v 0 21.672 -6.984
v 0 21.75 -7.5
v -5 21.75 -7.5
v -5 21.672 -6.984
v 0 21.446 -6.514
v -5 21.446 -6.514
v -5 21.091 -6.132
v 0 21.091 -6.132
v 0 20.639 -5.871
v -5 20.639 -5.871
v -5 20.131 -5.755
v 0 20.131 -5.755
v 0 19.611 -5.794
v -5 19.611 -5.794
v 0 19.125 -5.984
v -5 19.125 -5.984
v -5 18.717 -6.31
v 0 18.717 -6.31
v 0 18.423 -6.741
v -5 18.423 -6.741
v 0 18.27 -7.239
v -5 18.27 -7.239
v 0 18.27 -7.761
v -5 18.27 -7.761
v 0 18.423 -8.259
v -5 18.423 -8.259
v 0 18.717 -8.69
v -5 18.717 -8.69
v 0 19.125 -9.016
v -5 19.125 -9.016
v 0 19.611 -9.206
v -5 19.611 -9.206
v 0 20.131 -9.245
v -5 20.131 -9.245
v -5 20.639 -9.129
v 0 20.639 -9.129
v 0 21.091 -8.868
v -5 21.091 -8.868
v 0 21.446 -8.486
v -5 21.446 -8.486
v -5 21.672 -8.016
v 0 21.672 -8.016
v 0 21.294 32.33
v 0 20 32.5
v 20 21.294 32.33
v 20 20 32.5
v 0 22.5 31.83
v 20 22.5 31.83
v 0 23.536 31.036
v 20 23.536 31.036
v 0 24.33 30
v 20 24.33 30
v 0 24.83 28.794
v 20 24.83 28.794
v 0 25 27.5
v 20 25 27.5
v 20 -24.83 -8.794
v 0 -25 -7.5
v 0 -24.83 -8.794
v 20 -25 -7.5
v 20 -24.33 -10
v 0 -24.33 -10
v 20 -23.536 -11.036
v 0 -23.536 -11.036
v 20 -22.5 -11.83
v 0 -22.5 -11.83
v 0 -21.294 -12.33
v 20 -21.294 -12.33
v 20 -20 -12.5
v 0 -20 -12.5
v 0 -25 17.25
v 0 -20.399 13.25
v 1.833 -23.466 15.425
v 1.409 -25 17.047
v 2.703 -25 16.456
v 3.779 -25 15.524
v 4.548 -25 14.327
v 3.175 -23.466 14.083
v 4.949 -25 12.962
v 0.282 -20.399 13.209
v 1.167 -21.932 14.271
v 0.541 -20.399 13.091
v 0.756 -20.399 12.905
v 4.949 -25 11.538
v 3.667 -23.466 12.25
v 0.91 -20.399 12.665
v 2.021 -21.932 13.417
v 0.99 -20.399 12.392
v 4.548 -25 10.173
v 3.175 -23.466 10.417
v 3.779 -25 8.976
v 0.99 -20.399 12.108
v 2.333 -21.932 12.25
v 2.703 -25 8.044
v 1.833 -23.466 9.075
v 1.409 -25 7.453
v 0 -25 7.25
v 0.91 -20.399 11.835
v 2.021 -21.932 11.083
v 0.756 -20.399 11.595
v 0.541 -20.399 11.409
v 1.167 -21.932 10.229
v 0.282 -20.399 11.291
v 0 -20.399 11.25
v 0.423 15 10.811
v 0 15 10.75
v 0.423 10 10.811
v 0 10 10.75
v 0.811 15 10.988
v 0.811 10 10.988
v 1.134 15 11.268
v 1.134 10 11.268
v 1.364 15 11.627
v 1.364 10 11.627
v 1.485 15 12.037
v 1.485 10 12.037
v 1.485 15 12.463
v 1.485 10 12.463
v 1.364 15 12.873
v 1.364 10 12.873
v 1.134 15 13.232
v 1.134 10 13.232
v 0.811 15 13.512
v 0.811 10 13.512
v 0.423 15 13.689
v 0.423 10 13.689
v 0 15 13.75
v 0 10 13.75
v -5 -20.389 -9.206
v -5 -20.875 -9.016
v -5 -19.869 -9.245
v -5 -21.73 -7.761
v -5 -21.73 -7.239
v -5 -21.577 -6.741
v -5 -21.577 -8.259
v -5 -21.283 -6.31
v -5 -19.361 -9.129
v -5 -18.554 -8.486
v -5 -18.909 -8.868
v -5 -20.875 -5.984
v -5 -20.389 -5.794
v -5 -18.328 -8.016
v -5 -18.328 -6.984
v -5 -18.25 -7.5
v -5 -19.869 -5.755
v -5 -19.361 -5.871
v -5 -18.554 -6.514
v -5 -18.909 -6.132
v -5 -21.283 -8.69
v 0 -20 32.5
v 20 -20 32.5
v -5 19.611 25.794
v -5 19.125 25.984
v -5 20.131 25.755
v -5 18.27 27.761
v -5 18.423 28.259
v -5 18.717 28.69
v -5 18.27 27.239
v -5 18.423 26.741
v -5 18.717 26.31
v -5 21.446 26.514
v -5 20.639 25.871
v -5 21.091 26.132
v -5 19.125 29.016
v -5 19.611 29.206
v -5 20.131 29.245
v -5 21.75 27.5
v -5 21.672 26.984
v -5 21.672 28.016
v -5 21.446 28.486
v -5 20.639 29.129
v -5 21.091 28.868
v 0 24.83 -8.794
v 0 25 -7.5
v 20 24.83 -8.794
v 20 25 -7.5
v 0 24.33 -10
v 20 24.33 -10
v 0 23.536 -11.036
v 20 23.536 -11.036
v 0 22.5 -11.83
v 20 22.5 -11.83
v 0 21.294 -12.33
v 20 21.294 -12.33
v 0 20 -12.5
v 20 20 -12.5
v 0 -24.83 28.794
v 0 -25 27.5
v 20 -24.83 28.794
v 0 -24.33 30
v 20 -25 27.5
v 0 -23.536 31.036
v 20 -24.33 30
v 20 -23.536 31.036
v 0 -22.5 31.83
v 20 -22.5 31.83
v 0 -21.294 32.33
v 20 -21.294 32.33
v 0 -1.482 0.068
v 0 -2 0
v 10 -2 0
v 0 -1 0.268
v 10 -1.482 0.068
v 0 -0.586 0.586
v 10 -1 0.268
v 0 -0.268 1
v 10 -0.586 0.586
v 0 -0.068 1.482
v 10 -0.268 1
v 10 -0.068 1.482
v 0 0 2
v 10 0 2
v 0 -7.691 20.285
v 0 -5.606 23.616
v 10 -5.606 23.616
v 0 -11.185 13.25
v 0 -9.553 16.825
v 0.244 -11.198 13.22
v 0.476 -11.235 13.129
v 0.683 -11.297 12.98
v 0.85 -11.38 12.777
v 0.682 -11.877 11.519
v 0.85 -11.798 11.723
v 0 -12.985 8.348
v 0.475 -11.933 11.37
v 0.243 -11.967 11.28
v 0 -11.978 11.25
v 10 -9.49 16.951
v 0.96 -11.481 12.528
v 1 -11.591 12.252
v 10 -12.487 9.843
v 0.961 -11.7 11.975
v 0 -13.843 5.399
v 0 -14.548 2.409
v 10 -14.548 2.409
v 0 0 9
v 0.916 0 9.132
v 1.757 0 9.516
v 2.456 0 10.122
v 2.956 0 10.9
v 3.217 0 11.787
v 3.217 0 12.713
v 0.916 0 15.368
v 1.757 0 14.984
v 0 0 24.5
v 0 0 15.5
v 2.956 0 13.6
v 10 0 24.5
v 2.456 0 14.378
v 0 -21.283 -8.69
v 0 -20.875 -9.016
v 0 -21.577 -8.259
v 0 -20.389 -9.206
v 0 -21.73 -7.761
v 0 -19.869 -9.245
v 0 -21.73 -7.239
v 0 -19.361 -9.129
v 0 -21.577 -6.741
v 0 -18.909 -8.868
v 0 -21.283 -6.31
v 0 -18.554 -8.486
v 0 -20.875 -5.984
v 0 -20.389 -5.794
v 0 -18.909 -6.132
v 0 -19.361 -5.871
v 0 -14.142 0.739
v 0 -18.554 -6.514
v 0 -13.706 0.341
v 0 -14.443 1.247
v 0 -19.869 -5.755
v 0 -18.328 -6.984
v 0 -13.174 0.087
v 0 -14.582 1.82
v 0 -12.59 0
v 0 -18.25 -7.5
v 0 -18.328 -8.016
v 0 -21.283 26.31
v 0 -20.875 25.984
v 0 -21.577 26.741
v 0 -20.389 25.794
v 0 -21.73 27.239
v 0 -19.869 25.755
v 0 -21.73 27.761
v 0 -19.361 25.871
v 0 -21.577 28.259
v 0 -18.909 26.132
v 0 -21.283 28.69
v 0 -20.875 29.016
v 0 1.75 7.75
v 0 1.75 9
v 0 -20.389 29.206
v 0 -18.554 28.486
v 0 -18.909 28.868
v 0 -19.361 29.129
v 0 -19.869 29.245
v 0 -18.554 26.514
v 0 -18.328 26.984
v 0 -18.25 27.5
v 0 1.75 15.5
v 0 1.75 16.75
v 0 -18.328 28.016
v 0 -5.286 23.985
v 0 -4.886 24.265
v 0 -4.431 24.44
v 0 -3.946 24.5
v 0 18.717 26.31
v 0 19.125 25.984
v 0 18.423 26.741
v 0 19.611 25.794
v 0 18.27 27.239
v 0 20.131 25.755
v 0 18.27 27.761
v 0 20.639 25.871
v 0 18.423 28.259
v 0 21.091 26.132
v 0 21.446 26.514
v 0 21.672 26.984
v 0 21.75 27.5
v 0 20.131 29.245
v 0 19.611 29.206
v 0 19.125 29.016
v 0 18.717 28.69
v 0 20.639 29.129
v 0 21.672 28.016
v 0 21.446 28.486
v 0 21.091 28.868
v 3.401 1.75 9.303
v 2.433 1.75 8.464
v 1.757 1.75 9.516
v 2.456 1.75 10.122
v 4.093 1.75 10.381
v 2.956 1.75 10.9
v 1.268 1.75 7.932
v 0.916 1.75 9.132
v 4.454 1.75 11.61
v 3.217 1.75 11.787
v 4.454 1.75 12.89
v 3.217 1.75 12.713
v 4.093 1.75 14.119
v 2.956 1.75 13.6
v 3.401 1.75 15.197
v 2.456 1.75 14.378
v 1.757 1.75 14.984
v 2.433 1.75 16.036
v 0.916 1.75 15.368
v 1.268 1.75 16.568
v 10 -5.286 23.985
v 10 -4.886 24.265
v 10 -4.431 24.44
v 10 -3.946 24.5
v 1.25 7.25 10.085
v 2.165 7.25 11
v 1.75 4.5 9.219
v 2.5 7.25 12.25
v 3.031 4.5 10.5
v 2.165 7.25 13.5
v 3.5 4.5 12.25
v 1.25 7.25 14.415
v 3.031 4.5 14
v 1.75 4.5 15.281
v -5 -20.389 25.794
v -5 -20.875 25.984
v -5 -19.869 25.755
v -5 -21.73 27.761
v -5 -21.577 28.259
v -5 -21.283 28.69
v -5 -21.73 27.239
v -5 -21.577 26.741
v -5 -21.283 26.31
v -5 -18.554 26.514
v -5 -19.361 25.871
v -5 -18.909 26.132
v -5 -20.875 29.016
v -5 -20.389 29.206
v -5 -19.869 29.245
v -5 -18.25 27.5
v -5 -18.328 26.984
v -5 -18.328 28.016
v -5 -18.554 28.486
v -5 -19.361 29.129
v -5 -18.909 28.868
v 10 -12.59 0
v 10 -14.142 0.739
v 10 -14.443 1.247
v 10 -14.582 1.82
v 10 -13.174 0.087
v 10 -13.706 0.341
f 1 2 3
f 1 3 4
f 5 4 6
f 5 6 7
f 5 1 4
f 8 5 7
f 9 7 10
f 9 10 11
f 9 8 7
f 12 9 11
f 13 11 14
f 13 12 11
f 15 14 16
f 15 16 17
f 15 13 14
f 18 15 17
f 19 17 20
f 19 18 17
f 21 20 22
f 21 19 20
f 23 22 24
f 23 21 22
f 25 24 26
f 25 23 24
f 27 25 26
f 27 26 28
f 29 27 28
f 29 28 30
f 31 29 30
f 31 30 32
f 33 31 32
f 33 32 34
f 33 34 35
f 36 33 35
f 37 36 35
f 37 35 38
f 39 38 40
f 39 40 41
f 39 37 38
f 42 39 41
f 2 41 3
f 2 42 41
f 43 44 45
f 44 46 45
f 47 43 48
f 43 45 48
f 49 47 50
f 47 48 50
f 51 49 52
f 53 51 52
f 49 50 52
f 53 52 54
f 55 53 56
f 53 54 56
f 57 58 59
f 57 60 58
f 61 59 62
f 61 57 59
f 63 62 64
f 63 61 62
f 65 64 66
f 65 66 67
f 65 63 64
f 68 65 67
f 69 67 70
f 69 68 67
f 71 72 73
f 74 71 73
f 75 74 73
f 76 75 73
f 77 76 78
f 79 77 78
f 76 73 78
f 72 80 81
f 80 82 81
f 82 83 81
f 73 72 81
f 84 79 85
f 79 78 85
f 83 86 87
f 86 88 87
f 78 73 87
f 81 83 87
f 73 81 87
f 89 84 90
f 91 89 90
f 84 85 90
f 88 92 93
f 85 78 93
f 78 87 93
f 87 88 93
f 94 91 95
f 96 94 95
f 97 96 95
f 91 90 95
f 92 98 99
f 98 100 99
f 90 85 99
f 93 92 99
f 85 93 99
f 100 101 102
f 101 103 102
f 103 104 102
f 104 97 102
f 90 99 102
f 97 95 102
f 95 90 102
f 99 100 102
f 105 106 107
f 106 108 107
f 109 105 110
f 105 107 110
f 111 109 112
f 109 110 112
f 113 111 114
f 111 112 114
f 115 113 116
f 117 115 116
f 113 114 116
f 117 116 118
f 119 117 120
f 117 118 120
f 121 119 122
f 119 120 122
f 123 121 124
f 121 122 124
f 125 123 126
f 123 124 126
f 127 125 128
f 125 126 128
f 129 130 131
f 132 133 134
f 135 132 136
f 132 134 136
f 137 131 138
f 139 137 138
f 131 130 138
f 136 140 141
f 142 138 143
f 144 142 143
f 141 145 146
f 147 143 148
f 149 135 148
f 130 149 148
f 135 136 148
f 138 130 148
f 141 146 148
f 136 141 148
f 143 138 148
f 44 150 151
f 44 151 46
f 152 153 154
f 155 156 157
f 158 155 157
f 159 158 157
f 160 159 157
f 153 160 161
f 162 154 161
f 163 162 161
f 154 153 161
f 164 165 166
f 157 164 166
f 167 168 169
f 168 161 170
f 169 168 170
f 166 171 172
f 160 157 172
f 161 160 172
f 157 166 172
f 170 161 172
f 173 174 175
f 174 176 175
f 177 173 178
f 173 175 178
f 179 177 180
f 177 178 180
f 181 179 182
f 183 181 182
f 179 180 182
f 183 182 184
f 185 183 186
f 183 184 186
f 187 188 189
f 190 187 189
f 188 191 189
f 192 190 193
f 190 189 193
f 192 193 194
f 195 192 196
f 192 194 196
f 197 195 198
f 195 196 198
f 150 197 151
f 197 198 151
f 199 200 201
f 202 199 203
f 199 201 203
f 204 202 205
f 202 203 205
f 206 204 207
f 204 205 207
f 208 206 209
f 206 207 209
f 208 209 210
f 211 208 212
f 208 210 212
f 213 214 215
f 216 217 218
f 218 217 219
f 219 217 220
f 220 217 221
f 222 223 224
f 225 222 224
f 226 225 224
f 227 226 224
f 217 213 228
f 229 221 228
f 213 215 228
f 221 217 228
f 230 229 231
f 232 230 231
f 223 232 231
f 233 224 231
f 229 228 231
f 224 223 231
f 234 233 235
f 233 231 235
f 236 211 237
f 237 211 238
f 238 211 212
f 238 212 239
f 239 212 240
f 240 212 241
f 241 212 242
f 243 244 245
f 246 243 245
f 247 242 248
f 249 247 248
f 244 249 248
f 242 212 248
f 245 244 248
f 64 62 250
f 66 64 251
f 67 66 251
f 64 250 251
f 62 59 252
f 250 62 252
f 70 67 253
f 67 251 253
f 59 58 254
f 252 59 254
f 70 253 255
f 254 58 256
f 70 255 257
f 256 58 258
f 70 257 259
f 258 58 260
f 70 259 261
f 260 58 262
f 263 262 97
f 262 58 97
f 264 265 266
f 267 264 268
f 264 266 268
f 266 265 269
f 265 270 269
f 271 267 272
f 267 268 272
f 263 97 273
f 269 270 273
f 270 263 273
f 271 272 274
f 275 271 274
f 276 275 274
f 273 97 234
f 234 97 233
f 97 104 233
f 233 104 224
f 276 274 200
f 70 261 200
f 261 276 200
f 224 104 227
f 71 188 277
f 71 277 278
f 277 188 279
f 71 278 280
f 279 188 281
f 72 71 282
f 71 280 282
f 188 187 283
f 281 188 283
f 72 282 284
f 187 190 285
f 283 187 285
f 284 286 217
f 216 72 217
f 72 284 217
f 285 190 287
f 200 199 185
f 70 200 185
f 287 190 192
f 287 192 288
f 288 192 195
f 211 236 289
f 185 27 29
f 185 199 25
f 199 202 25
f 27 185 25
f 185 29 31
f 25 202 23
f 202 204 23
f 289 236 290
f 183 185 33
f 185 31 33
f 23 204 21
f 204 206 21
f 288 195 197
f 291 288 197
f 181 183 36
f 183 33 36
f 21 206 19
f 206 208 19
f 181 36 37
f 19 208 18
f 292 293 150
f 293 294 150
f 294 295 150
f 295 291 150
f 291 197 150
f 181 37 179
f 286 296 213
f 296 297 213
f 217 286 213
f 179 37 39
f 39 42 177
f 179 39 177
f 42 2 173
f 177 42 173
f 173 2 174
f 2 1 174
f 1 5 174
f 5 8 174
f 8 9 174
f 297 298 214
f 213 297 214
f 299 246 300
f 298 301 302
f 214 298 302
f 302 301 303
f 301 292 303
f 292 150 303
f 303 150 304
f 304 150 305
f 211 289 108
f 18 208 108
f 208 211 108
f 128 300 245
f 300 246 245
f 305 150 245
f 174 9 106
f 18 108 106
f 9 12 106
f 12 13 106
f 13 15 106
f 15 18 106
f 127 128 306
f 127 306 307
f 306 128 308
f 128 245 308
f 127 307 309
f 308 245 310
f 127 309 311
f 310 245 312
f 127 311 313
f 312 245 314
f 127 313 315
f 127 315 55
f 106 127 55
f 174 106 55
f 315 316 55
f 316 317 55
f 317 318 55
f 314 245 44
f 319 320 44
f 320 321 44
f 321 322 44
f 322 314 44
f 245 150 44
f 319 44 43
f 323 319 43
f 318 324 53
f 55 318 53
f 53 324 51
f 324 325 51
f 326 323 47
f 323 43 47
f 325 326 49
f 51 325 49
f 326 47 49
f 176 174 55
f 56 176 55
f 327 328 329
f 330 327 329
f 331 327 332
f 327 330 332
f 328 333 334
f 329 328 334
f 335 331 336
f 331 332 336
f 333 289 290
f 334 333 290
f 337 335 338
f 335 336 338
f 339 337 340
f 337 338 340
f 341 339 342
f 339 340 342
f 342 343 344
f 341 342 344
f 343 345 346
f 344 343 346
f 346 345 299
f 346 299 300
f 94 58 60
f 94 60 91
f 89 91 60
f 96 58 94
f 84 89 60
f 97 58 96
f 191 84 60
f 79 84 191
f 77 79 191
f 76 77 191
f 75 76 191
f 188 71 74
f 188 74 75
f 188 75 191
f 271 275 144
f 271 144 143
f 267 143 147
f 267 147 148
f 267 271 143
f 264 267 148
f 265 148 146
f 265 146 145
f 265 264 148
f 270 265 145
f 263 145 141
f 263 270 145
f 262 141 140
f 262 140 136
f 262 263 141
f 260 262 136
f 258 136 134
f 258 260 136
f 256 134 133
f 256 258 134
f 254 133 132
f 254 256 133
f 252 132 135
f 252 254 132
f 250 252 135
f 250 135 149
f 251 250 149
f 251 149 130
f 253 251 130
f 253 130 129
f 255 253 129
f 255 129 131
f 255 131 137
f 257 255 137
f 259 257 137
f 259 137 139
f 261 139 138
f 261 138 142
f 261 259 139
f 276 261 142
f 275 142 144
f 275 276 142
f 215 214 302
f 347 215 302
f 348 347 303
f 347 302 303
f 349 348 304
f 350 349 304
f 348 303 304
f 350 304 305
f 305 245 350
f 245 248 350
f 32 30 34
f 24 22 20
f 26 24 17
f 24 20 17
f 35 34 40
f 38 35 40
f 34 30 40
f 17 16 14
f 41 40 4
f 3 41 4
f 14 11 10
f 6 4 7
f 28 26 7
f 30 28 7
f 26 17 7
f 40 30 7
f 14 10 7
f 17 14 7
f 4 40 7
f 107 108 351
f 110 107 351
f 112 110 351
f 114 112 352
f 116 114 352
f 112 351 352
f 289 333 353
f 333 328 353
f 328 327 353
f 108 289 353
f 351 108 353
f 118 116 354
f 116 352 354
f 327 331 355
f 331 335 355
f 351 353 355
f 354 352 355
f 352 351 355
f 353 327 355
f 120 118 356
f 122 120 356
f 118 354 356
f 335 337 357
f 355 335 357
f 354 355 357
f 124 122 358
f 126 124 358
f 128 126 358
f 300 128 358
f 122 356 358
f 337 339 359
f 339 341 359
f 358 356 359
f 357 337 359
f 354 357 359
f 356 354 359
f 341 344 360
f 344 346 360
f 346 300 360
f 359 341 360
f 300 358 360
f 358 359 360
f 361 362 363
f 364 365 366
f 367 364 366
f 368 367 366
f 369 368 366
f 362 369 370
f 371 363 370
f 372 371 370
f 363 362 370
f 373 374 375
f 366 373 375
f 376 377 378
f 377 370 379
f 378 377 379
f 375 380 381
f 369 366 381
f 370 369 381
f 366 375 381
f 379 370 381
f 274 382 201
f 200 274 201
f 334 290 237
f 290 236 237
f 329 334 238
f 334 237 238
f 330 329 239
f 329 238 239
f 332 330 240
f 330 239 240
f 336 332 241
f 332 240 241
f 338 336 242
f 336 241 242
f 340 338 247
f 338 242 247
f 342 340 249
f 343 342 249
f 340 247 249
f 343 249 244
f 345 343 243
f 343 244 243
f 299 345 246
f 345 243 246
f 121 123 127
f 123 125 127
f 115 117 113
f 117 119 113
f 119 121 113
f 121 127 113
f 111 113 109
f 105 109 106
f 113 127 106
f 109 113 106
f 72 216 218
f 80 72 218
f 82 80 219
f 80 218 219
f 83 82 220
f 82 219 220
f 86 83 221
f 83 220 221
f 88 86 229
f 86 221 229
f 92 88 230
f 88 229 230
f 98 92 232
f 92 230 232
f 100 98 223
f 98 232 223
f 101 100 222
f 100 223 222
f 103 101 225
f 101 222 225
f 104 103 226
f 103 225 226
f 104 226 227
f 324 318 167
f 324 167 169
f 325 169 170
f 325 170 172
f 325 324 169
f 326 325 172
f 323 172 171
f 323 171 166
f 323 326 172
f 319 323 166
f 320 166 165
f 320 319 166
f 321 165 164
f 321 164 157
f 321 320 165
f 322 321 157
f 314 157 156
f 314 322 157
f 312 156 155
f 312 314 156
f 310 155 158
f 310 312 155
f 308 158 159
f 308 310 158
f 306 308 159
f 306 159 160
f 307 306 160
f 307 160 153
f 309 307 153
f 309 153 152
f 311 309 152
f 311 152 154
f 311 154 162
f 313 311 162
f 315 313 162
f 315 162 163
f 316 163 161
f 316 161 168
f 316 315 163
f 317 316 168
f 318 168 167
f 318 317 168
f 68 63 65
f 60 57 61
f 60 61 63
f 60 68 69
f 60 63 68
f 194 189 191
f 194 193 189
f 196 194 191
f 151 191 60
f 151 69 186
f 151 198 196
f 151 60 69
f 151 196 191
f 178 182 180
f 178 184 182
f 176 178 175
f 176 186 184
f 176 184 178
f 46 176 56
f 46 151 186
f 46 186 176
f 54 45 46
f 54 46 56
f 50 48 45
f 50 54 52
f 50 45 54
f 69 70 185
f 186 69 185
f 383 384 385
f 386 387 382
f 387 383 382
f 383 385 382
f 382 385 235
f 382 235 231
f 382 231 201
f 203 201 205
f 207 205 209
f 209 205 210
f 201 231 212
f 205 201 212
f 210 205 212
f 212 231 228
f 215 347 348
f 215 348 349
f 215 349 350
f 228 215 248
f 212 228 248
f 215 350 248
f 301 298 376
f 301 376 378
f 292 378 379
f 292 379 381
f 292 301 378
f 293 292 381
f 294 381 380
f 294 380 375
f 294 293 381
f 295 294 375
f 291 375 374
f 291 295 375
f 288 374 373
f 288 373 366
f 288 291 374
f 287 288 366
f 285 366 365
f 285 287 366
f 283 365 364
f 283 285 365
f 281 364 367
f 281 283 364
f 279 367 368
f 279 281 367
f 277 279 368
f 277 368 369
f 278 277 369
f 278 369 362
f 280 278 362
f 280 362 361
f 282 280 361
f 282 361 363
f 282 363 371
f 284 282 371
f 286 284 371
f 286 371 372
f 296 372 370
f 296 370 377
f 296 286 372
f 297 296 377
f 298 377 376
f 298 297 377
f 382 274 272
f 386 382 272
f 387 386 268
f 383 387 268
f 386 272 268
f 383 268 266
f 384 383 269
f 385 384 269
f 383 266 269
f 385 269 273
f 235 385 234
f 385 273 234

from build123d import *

# Parameters (mm, degrees)
F1_DEPTH        = 10
F5_R            = 2
F6_W            = 50
F6_H            = 45
F7_DEPTH        = 20
F10_D           = 2
F10_DEPTH       = 20
F10_CSINK_D     = 10
F10_CSINK_ANGLE = 82
F11_R           = 5
F12_R           = 1.75
F13_DEPTH       = 5


with BuildPart() as f1:
    # F0 (on Right) → F1 (new body, symmetric)
    with BuildSketch(Plane.YZ):
        with BuildLine():
            Line((-15, 0), (0, 0))
            Line((0, 0), (0, 24.5))
            Line((0, 24.5), (-5, 24.5))
            ThreePointArc((-5, 24.5), (-11.367509, 12.808167), (-15, 0))
        make_face()
    extrude(amount=F1_DEPTH, both=True)

    # F3 (on Right) → F4 (revolve)
    with BuildSketch(Plane.YZ):
        Polygon((0, 12.25), (15, 12.25), (15, 13.75), (10, 13.75), (1.75, 16.75), (1.75, 15.5), (0, 15.5), align=None)
    revolve(axis=Axis((0, 7.5, 12.25), (0, -1, 0)))

    # F5
    f5_edges = [f1.edges().sort_by_distance(p)[0] for p in [
        (0, -5, 24.5),
        (0, -15, 0),
        (0, 0, 0),
    ]]
    fillet(f5_edges, radius=F5_R)


with BuildPart() as f7:
    # F6 (on Right) → F7 (new body)
    with BuildSketch(Plane.YZ):
        with Locations((0, 10)):
            Rectangle(F6_W, F6_H)
    extrude(amount=F7_DEPTH)

    # F8: cut F1
    add(f1.part, mode=Mode.SUBTRACT)

    # F10
    with Locations(Plane.XZ.offset(25)):
        with Locations((0, 12.25)):
            CounterSinkHole(F10_D / 2, F10_CSINK_D / 2, depth=F10_DEPTH, counter_sink_angle=F10_CSINK_ANGLE)

    # F11
    f11_edges = [f7.edges().sort_by_distance(p)[0] for p in [
        (10, -25, 32.5),
        (10, 25, 32.5),
        (10, -25, -12.5),
        (10, 25, -12.5),
    ]]
    fillet(f11_edges, radius=F11_R)

    # F12 (on face) → F13 (join)
    with BuildSketch(Plane.YZ):
        with Locations((20, 27.5)):
            Circle(F12_R)
        with Locations((-20, 27.5)):
            Circle(F12_R)
        with Locations((-20, -7.5)):
            Circle(F12_R)
        with Locations((20, -7.5)):
            Circle(F12_R)
    extrude(amount=-F13_DEPTH)


solid = f7.part
